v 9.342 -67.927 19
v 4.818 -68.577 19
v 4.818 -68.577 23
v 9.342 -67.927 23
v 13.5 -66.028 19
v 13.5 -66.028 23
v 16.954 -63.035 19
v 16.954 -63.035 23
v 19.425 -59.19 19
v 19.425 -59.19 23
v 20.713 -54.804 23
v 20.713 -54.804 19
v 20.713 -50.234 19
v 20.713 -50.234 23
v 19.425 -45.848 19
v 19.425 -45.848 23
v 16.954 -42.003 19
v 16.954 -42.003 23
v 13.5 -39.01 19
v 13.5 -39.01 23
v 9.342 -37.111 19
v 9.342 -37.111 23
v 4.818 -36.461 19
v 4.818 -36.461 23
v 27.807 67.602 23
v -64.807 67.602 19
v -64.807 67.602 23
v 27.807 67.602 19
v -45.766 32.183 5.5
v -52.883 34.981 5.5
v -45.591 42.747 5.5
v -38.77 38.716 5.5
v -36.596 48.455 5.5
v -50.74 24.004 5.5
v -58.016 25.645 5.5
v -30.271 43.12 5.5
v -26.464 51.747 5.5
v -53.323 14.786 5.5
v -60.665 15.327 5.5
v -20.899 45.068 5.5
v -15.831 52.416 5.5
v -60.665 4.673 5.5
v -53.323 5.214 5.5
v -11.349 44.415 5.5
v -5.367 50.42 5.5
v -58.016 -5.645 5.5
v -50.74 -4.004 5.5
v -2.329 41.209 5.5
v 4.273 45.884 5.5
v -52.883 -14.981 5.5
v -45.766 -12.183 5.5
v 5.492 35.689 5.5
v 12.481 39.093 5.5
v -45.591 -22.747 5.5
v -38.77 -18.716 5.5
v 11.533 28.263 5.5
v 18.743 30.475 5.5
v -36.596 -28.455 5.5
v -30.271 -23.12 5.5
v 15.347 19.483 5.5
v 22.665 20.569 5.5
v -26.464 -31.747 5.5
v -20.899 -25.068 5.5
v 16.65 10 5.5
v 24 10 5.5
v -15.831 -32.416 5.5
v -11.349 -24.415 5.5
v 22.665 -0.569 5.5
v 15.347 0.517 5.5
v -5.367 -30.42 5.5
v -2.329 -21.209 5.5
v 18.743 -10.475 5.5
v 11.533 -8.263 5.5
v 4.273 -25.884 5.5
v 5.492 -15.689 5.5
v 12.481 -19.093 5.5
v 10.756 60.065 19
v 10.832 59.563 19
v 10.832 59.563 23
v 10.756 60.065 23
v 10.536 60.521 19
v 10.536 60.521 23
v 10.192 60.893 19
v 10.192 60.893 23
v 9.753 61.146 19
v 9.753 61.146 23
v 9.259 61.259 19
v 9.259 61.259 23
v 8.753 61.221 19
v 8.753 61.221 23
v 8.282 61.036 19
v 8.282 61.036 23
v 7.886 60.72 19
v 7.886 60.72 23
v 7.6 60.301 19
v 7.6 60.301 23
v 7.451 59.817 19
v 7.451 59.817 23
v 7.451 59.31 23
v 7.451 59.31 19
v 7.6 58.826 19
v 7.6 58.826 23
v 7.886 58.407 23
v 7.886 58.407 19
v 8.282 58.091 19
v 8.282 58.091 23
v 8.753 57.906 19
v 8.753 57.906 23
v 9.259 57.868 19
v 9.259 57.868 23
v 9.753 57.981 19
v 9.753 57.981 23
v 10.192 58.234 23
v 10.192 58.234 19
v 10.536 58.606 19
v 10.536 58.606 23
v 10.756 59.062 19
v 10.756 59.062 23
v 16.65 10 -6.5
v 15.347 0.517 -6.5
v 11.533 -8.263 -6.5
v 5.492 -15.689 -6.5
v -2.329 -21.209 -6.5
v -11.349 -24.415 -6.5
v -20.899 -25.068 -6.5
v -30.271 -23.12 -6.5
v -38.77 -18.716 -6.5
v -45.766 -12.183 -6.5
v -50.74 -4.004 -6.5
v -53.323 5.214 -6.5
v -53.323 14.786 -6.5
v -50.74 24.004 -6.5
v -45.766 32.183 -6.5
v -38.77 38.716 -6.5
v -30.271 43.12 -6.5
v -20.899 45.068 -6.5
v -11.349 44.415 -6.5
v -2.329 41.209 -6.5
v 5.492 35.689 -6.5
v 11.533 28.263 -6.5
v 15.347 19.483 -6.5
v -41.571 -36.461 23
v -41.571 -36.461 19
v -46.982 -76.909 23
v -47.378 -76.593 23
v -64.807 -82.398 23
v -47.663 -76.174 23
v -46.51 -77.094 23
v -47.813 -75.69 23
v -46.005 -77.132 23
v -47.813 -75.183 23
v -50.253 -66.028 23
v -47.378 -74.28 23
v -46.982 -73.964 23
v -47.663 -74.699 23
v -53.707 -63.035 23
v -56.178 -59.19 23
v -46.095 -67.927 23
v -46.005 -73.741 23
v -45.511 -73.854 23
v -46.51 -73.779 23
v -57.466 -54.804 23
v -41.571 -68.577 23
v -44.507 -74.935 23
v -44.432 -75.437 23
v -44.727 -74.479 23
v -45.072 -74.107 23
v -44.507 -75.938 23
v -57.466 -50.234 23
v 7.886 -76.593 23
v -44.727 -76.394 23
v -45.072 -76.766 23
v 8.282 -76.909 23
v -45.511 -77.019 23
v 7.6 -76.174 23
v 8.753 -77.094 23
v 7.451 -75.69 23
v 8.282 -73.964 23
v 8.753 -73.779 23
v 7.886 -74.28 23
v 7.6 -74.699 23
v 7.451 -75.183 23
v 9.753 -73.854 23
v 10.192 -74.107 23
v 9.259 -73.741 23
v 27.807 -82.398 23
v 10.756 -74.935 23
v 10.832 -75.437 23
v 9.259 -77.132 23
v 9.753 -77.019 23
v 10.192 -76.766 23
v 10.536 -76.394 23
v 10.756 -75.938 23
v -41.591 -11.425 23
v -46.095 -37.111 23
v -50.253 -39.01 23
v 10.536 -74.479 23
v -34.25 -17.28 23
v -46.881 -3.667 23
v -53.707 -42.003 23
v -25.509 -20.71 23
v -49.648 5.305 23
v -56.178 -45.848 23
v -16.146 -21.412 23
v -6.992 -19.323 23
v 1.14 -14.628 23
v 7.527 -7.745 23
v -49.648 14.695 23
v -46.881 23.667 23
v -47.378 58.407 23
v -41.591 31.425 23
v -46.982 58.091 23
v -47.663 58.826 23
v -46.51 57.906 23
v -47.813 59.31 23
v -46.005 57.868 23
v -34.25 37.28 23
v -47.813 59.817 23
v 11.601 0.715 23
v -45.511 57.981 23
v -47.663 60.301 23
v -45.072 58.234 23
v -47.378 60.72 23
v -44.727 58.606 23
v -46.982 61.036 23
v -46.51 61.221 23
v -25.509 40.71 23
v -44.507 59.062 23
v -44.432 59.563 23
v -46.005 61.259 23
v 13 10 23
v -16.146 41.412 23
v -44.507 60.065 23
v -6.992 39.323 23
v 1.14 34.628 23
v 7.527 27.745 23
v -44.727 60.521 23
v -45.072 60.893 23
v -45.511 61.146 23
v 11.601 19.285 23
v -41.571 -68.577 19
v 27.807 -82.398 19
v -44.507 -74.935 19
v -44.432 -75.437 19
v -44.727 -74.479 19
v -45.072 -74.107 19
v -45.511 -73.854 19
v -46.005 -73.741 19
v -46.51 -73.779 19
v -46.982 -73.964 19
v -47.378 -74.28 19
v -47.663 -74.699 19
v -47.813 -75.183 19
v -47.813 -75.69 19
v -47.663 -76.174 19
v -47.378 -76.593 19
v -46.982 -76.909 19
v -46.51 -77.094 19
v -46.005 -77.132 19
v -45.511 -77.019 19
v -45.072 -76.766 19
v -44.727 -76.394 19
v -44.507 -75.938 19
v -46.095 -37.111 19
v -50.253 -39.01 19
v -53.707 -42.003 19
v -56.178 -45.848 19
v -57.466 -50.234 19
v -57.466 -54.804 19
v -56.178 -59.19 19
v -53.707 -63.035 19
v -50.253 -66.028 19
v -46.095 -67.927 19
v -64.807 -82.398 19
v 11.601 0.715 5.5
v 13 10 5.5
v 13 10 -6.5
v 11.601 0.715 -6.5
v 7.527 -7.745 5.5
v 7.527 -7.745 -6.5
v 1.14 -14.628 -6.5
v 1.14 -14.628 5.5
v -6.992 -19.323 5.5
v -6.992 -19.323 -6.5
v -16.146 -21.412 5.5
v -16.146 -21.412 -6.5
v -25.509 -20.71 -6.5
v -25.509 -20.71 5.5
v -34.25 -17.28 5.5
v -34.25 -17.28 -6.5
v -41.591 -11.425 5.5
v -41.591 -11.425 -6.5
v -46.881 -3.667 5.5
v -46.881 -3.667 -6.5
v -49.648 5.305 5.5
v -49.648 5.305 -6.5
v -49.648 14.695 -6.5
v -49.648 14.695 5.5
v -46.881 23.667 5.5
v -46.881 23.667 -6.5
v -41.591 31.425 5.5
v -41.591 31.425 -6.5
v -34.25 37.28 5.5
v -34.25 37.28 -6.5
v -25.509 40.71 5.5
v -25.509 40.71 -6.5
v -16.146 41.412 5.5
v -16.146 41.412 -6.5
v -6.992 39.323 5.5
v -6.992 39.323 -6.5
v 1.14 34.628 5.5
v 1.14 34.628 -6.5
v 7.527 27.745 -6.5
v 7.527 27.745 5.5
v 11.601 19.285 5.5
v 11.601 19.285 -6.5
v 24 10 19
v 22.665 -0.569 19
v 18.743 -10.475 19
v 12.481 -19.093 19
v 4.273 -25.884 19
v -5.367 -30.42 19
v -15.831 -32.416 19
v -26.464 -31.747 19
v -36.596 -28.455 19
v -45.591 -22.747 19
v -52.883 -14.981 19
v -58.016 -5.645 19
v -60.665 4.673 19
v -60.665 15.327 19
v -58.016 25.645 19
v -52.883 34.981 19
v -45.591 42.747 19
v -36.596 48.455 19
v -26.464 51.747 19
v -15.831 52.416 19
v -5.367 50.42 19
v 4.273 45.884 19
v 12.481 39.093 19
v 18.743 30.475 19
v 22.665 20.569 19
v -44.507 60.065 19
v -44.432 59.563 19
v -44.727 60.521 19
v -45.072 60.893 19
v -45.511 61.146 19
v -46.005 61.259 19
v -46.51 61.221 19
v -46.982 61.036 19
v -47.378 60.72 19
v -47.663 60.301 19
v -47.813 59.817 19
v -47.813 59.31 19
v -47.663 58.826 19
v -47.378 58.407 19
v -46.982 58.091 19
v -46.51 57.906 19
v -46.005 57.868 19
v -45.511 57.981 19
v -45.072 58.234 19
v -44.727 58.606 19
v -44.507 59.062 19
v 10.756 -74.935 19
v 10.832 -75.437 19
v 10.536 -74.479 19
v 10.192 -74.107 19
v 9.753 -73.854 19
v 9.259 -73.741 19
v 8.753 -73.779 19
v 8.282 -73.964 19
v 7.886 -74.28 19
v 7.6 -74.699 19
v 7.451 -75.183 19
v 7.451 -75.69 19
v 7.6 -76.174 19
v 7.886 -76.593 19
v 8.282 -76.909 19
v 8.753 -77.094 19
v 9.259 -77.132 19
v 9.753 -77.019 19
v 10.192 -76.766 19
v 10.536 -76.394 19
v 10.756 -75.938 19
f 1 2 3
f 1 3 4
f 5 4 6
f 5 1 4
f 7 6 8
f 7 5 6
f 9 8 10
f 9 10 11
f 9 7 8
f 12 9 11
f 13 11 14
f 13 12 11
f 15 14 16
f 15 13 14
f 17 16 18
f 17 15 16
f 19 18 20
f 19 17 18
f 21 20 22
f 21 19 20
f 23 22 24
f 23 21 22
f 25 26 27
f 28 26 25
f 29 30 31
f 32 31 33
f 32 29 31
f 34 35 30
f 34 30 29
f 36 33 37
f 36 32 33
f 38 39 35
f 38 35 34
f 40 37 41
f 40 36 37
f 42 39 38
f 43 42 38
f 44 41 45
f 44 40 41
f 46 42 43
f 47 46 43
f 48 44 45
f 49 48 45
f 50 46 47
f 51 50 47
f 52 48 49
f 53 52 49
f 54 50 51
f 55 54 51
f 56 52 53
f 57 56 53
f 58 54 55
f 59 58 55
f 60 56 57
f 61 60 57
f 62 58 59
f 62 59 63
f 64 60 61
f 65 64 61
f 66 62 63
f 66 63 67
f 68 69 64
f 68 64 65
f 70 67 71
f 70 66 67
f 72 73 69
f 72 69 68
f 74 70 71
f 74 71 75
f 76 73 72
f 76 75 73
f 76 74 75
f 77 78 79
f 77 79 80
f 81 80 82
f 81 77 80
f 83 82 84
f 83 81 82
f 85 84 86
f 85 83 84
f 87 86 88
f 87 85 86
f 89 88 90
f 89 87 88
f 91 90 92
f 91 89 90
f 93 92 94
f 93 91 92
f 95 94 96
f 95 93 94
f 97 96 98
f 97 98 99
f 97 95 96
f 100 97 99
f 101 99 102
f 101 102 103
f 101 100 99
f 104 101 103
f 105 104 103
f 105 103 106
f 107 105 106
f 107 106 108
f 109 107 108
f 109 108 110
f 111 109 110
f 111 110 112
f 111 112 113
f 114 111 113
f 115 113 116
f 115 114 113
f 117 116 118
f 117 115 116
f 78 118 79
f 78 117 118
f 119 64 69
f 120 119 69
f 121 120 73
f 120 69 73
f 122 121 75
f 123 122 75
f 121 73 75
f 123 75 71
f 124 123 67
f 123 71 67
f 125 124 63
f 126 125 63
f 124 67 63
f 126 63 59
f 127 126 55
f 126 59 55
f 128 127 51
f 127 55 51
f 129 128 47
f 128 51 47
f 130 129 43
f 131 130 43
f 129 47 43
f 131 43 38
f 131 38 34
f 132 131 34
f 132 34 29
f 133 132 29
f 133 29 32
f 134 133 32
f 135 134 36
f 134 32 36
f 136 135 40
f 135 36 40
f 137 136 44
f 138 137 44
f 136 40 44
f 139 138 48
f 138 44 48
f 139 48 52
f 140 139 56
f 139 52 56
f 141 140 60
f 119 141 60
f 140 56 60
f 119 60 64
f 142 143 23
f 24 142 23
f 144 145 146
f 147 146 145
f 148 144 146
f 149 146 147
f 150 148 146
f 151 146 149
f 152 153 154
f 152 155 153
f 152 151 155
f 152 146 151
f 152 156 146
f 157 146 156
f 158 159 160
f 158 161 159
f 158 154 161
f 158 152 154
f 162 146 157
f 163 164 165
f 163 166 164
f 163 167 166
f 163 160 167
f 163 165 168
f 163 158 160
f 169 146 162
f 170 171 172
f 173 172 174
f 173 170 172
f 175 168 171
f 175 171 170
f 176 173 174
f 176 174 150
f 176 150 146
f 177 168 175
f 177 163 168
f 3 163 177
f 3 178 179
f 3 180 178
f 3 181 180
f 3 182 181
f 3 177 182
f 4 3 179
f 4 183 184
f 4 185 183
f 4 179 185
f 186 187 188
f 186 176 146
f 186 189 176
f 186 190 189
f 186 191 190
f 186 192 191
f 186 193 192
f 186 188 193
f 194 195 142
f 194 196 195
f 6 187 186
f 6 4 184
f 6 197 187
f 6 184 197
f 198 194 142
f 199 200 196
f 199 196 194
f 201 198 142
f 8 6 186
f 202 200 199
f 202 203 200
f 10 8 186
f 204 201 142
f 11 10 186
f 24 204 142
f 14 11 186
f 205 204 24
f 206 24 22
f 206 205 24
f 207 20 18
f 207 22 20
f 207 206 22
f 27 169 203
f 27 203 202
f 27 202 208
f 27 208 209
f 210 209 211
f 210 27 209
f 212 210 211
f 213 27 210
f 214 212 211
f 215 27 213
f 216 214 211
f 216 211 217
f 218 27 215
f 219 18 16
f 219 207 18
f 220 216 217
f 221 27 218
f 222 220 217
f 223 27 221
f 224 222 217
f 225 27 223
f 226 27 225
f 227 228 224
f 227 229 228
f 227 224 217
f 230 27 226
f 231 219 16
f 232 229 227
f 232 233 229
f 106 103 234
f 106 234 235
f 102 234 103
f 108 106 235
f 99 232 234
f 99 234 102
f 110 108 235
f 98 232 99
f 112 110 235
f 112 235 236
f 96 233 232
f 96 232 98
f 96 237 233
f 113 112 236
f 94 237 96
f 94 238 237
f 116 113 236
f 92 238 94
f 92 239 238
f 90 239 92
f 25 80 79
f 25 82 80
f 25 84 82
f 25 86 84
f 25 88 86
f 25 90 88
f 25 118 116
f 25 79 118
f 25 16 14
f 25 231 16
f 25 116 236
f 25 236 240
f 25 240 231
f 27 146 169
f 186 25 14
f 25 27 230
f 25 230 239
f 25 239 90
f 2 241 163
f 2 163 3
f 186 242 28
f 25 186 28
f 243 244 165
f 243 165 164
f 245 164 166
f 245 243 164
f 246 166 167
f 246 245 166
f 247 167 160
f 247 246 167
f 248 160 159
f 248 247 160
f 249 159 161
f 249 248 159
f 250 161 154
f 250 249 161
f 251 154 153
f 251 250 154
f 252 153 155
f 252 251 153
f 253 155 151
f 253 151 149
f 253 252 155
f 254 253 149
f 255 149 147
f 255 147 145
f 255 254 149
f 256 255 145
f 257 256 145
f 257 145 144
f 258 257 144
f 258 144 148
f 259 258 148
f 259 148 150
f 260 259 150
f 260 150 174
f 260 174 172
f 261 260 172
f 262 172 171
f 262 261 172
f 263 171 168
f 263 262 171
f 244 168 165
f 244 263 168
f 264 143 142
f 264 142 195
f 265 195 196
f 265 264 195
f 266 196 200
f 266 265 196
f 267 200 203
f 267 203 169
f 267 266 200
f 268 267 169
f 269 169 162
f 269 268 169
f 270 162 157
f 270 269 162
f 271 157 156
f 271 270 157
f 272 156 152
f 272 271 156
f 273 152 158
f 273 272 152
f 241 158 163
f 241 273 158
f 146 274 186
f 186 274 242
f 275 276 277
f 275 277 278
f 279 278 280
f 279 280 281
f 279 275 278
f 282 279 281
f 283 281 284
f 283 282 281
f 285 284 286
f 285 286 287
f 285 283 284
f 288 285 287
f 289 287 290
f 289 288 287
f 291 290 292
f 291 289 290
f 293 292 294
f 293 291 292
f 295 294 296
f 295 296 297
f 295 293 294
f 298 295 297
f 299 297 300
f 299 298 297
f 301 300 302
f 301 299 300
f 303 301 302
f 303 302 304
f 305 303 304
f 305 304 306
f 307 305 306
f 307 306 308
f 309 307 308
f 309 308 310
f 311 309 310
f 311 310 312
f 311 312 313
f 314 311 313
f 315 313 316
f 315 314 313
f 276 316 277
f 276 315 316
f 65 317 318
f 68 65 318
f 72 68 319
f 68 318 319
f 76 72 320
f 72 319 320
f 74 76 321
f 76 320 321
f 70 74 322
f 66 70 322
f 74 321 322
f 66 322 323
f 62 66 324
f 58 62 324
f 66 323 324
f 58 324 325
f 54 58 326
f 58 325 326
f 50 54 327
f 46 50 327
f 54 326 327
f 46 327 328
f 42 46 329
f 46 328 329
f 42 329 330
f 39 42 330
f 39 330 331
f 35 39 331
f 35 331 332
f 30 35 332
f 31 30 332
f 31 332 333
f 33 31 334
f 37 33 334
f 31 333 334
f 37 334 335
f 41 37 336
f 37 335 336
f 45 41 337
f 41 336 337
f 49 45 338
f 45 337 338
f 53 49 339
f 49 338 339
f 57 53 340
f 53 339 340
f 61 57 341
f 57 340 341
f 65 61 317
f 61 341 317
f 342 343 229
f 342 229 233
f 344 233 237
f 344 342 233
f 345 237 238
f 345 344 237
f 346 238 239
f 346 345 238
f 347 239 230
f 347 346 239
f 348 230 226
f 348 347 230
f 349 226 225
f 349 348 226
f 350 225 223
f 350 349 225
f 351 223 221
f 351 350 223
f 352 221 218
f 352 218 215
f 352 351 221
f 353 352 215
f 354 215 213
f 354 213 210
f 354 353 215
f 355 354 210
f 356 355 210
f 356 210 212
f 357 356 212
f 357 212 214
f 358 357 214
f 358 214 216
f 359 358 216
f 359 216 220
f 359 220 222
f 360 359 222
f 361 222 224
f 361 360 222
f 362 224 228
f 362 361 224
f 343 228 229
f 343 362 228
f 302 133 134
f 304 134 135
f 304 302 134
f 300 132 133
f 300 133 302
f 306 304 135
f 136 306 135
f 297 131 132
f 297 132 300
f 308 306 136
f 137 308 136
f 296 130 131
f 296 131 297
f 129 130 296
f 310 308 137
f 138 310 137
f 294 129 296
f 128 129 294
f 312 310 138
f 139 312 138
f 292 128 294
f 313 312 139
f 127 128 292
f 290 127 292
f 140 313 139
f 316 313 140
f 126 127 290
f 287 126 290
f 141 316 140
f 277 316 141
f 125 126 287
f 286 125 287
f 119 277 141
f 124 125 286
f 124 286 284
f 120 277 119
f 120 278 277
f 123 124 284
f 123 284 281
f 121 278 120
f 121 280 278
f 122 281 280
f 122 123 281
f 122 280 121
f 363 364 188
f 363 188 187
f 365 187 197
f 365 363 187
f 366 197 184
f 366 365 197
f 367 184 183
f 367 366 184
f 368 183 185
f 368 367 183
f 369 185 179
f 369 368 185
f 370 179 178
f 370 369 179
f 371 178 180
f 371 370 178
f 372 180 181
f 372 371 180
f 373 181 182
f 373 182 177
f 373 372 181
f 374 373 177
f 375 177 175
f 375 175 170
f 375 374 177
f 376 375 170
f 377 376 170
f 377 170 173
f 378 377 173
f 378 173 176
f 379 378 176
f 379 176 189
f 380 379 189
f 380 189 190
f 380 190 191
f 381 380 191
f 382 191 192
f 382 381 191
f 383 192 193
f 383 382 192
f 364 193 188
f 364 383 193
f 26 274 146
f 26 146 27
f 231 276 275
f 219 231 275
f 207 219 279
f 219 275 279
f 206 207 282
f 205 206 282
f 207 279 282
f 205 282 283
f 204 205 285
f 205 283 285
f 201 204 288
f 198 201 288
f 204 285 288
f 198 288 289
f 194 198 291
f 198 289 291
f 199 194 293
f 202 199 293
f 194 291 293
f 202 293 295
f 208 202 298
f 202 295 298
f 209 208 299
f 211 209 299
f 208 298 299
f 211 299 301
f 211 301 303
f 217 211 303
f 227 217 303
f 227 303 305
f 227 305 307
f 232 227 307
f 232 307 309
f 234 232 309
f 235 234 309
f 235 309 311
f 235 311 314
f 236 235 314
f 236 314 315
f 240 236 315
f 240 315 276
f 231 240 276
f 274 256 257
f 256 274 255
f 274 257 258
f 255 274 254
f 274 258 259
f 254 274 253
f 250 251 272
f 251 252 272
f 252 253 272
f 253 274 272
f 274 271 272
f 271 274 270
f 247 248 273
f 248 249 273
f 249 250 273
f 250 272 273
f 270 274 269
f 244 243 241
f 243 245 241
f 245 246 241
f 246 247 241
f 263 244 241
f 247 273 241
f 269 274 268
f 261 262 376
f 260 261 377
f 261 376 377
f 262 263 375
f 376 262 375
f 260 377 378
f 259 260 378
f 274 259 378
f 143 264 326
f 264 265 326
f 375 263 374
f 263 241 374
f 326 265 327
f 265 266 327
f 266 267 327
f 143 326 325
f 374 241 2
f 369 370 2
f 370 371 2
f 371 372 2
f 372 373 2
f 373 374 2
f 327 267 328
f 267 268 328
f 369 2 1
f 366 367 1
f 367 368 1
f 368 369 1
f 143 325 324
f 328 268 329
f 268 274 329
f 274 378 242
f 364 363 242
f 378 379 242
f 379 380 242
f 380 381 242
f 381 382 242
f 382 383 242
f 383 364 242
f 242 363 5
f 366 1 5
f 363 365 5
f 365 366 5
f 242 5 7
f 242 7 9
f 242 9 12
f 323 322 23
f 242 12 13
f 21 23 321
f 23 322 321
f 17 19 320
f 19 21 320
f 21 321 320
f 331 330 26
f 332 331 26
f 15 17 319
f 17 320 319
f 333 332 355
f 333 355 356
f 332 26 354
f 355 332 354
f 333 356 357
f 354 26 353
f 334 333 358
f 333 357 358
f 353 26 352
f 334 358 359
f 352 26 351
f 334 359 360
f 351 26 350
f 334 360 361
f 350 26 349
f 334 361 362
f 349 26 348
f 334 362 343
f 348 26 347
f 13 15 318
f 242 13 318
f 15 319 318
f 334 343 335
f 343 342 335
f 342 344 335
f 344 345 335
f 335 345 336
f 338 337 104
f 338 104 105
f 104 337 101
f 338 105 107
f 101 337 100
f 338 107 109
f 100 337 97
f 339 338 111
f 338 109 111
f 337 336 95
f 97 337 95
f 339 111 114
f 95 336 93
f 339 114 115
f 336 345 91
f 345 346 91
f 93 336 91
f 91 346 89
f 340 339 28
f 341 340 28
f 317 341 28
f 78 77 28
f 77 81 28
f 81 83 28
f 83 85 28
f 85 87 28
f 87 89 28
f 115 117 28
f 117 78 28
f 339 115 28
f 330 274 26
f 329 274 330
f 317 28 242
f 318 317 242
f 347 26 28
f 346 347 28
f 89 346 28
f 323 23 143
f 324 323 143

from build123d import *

# Parameters (mm, degrees)
SKETCH107_W     = 92.613678
SKETCH107_H     = 150
SKETCH107_R     = 1.7
PAD044_DEPTH    = 4
SKETCH106_R     = 42.5
PAD043_DEPTH    = 13.5
SKETCH105_R     = 35.15
SKETCH105_R_2   = 31.5
PAD042_DEPTH    = 12
SKETCH130_R     = 31.5
POCKET023_DEPTH = 20


with BuildPart() as part:
    # Sketch107 → Pad044 (new body)
    with BuildSketch(Plane.XY):
        with Locations((0, -17.3981255757)):
            Rectangle(SKETCH107_W, SKETCH107_H)
        with Locations((-27.6317588753, 49.5634491508)):
            Circle(SKETCH107_R, mode=Mode.SUBTRACT)
        with Locations((27.6317588753, 49.5634491508)):
            Circle(SKETCH107_R, mode=Mode.SUBTRACT)
        with Locations((27.6317588753, -85.4365508492)):
            Circle(SKETCH107_R, mode=Mode.SUBTRACT)
        with Locations((-27.6317588753, -85.4365508492)):
            Circle(SKETCH107_R, mode=Mode.SUBTRACT)
        with BuildLine():
            ThreePointArc((-23.0708364387, -46.4607558182), (-39.1290583868, -62.5189777662), (-23.0708364387, -78.5771997143))
            Line((-23.0708364387, -78.5771997143), (23.317797, -78.5771997143))
            ThreePointArc((23.317797, -78.5771997143), (39.3760189481, -62.5189777662), (23.317797, -46.4607558182))
            Line((-23.0708364387, -46.4607558182), (23.317797, -46.4607558182))
        make_face(mode=Mode.SUBTRACT)
    extrude(amount=PAD044_DEPTH)

    # Sketch106 (on Face13 of Pad044) → Pad043 (join)
    with BuildSketch(Plane(origin=(0, 0, 0), x_dir=(1, 0, 0), z_dir=(0, 0, -1))):
        Circle(SKETCH106_R)
    extrude(amount=PAD043_DEPTH)

    # Sketch105 (on Face16 of Pad043) → Pad042 (join)
    with BuildSketch(Plane(origin=(0, 0, -13.5), x_dir=(1, 0, 0), z_dir=(0, 0, -1))):
        Circle(SKETCH105_R)
        Circle(SKETCH105_R_2, mode=Mode.SUBTRACT)
    extrude(amount=PAD042_DEPTH)

    # Sketch130 (on Face20 of Pad042) → Pocket023 (cut)
    with BuildSketch(Plane(origin=(0, 0, -13.5), x_dir=(1, 0, 0), z_dir=(0, 0, -1))):
        Circle(SKETCH130_R)
    extrude(amount=-POCKET023_DEPTH, mode=Mode.SUBTRACT)


with BuildPart() as part_1:
    # Body012 placement: moved
    add(part.part.moved(Location((-18.5, 10, 19))))


solid = part_1.part
